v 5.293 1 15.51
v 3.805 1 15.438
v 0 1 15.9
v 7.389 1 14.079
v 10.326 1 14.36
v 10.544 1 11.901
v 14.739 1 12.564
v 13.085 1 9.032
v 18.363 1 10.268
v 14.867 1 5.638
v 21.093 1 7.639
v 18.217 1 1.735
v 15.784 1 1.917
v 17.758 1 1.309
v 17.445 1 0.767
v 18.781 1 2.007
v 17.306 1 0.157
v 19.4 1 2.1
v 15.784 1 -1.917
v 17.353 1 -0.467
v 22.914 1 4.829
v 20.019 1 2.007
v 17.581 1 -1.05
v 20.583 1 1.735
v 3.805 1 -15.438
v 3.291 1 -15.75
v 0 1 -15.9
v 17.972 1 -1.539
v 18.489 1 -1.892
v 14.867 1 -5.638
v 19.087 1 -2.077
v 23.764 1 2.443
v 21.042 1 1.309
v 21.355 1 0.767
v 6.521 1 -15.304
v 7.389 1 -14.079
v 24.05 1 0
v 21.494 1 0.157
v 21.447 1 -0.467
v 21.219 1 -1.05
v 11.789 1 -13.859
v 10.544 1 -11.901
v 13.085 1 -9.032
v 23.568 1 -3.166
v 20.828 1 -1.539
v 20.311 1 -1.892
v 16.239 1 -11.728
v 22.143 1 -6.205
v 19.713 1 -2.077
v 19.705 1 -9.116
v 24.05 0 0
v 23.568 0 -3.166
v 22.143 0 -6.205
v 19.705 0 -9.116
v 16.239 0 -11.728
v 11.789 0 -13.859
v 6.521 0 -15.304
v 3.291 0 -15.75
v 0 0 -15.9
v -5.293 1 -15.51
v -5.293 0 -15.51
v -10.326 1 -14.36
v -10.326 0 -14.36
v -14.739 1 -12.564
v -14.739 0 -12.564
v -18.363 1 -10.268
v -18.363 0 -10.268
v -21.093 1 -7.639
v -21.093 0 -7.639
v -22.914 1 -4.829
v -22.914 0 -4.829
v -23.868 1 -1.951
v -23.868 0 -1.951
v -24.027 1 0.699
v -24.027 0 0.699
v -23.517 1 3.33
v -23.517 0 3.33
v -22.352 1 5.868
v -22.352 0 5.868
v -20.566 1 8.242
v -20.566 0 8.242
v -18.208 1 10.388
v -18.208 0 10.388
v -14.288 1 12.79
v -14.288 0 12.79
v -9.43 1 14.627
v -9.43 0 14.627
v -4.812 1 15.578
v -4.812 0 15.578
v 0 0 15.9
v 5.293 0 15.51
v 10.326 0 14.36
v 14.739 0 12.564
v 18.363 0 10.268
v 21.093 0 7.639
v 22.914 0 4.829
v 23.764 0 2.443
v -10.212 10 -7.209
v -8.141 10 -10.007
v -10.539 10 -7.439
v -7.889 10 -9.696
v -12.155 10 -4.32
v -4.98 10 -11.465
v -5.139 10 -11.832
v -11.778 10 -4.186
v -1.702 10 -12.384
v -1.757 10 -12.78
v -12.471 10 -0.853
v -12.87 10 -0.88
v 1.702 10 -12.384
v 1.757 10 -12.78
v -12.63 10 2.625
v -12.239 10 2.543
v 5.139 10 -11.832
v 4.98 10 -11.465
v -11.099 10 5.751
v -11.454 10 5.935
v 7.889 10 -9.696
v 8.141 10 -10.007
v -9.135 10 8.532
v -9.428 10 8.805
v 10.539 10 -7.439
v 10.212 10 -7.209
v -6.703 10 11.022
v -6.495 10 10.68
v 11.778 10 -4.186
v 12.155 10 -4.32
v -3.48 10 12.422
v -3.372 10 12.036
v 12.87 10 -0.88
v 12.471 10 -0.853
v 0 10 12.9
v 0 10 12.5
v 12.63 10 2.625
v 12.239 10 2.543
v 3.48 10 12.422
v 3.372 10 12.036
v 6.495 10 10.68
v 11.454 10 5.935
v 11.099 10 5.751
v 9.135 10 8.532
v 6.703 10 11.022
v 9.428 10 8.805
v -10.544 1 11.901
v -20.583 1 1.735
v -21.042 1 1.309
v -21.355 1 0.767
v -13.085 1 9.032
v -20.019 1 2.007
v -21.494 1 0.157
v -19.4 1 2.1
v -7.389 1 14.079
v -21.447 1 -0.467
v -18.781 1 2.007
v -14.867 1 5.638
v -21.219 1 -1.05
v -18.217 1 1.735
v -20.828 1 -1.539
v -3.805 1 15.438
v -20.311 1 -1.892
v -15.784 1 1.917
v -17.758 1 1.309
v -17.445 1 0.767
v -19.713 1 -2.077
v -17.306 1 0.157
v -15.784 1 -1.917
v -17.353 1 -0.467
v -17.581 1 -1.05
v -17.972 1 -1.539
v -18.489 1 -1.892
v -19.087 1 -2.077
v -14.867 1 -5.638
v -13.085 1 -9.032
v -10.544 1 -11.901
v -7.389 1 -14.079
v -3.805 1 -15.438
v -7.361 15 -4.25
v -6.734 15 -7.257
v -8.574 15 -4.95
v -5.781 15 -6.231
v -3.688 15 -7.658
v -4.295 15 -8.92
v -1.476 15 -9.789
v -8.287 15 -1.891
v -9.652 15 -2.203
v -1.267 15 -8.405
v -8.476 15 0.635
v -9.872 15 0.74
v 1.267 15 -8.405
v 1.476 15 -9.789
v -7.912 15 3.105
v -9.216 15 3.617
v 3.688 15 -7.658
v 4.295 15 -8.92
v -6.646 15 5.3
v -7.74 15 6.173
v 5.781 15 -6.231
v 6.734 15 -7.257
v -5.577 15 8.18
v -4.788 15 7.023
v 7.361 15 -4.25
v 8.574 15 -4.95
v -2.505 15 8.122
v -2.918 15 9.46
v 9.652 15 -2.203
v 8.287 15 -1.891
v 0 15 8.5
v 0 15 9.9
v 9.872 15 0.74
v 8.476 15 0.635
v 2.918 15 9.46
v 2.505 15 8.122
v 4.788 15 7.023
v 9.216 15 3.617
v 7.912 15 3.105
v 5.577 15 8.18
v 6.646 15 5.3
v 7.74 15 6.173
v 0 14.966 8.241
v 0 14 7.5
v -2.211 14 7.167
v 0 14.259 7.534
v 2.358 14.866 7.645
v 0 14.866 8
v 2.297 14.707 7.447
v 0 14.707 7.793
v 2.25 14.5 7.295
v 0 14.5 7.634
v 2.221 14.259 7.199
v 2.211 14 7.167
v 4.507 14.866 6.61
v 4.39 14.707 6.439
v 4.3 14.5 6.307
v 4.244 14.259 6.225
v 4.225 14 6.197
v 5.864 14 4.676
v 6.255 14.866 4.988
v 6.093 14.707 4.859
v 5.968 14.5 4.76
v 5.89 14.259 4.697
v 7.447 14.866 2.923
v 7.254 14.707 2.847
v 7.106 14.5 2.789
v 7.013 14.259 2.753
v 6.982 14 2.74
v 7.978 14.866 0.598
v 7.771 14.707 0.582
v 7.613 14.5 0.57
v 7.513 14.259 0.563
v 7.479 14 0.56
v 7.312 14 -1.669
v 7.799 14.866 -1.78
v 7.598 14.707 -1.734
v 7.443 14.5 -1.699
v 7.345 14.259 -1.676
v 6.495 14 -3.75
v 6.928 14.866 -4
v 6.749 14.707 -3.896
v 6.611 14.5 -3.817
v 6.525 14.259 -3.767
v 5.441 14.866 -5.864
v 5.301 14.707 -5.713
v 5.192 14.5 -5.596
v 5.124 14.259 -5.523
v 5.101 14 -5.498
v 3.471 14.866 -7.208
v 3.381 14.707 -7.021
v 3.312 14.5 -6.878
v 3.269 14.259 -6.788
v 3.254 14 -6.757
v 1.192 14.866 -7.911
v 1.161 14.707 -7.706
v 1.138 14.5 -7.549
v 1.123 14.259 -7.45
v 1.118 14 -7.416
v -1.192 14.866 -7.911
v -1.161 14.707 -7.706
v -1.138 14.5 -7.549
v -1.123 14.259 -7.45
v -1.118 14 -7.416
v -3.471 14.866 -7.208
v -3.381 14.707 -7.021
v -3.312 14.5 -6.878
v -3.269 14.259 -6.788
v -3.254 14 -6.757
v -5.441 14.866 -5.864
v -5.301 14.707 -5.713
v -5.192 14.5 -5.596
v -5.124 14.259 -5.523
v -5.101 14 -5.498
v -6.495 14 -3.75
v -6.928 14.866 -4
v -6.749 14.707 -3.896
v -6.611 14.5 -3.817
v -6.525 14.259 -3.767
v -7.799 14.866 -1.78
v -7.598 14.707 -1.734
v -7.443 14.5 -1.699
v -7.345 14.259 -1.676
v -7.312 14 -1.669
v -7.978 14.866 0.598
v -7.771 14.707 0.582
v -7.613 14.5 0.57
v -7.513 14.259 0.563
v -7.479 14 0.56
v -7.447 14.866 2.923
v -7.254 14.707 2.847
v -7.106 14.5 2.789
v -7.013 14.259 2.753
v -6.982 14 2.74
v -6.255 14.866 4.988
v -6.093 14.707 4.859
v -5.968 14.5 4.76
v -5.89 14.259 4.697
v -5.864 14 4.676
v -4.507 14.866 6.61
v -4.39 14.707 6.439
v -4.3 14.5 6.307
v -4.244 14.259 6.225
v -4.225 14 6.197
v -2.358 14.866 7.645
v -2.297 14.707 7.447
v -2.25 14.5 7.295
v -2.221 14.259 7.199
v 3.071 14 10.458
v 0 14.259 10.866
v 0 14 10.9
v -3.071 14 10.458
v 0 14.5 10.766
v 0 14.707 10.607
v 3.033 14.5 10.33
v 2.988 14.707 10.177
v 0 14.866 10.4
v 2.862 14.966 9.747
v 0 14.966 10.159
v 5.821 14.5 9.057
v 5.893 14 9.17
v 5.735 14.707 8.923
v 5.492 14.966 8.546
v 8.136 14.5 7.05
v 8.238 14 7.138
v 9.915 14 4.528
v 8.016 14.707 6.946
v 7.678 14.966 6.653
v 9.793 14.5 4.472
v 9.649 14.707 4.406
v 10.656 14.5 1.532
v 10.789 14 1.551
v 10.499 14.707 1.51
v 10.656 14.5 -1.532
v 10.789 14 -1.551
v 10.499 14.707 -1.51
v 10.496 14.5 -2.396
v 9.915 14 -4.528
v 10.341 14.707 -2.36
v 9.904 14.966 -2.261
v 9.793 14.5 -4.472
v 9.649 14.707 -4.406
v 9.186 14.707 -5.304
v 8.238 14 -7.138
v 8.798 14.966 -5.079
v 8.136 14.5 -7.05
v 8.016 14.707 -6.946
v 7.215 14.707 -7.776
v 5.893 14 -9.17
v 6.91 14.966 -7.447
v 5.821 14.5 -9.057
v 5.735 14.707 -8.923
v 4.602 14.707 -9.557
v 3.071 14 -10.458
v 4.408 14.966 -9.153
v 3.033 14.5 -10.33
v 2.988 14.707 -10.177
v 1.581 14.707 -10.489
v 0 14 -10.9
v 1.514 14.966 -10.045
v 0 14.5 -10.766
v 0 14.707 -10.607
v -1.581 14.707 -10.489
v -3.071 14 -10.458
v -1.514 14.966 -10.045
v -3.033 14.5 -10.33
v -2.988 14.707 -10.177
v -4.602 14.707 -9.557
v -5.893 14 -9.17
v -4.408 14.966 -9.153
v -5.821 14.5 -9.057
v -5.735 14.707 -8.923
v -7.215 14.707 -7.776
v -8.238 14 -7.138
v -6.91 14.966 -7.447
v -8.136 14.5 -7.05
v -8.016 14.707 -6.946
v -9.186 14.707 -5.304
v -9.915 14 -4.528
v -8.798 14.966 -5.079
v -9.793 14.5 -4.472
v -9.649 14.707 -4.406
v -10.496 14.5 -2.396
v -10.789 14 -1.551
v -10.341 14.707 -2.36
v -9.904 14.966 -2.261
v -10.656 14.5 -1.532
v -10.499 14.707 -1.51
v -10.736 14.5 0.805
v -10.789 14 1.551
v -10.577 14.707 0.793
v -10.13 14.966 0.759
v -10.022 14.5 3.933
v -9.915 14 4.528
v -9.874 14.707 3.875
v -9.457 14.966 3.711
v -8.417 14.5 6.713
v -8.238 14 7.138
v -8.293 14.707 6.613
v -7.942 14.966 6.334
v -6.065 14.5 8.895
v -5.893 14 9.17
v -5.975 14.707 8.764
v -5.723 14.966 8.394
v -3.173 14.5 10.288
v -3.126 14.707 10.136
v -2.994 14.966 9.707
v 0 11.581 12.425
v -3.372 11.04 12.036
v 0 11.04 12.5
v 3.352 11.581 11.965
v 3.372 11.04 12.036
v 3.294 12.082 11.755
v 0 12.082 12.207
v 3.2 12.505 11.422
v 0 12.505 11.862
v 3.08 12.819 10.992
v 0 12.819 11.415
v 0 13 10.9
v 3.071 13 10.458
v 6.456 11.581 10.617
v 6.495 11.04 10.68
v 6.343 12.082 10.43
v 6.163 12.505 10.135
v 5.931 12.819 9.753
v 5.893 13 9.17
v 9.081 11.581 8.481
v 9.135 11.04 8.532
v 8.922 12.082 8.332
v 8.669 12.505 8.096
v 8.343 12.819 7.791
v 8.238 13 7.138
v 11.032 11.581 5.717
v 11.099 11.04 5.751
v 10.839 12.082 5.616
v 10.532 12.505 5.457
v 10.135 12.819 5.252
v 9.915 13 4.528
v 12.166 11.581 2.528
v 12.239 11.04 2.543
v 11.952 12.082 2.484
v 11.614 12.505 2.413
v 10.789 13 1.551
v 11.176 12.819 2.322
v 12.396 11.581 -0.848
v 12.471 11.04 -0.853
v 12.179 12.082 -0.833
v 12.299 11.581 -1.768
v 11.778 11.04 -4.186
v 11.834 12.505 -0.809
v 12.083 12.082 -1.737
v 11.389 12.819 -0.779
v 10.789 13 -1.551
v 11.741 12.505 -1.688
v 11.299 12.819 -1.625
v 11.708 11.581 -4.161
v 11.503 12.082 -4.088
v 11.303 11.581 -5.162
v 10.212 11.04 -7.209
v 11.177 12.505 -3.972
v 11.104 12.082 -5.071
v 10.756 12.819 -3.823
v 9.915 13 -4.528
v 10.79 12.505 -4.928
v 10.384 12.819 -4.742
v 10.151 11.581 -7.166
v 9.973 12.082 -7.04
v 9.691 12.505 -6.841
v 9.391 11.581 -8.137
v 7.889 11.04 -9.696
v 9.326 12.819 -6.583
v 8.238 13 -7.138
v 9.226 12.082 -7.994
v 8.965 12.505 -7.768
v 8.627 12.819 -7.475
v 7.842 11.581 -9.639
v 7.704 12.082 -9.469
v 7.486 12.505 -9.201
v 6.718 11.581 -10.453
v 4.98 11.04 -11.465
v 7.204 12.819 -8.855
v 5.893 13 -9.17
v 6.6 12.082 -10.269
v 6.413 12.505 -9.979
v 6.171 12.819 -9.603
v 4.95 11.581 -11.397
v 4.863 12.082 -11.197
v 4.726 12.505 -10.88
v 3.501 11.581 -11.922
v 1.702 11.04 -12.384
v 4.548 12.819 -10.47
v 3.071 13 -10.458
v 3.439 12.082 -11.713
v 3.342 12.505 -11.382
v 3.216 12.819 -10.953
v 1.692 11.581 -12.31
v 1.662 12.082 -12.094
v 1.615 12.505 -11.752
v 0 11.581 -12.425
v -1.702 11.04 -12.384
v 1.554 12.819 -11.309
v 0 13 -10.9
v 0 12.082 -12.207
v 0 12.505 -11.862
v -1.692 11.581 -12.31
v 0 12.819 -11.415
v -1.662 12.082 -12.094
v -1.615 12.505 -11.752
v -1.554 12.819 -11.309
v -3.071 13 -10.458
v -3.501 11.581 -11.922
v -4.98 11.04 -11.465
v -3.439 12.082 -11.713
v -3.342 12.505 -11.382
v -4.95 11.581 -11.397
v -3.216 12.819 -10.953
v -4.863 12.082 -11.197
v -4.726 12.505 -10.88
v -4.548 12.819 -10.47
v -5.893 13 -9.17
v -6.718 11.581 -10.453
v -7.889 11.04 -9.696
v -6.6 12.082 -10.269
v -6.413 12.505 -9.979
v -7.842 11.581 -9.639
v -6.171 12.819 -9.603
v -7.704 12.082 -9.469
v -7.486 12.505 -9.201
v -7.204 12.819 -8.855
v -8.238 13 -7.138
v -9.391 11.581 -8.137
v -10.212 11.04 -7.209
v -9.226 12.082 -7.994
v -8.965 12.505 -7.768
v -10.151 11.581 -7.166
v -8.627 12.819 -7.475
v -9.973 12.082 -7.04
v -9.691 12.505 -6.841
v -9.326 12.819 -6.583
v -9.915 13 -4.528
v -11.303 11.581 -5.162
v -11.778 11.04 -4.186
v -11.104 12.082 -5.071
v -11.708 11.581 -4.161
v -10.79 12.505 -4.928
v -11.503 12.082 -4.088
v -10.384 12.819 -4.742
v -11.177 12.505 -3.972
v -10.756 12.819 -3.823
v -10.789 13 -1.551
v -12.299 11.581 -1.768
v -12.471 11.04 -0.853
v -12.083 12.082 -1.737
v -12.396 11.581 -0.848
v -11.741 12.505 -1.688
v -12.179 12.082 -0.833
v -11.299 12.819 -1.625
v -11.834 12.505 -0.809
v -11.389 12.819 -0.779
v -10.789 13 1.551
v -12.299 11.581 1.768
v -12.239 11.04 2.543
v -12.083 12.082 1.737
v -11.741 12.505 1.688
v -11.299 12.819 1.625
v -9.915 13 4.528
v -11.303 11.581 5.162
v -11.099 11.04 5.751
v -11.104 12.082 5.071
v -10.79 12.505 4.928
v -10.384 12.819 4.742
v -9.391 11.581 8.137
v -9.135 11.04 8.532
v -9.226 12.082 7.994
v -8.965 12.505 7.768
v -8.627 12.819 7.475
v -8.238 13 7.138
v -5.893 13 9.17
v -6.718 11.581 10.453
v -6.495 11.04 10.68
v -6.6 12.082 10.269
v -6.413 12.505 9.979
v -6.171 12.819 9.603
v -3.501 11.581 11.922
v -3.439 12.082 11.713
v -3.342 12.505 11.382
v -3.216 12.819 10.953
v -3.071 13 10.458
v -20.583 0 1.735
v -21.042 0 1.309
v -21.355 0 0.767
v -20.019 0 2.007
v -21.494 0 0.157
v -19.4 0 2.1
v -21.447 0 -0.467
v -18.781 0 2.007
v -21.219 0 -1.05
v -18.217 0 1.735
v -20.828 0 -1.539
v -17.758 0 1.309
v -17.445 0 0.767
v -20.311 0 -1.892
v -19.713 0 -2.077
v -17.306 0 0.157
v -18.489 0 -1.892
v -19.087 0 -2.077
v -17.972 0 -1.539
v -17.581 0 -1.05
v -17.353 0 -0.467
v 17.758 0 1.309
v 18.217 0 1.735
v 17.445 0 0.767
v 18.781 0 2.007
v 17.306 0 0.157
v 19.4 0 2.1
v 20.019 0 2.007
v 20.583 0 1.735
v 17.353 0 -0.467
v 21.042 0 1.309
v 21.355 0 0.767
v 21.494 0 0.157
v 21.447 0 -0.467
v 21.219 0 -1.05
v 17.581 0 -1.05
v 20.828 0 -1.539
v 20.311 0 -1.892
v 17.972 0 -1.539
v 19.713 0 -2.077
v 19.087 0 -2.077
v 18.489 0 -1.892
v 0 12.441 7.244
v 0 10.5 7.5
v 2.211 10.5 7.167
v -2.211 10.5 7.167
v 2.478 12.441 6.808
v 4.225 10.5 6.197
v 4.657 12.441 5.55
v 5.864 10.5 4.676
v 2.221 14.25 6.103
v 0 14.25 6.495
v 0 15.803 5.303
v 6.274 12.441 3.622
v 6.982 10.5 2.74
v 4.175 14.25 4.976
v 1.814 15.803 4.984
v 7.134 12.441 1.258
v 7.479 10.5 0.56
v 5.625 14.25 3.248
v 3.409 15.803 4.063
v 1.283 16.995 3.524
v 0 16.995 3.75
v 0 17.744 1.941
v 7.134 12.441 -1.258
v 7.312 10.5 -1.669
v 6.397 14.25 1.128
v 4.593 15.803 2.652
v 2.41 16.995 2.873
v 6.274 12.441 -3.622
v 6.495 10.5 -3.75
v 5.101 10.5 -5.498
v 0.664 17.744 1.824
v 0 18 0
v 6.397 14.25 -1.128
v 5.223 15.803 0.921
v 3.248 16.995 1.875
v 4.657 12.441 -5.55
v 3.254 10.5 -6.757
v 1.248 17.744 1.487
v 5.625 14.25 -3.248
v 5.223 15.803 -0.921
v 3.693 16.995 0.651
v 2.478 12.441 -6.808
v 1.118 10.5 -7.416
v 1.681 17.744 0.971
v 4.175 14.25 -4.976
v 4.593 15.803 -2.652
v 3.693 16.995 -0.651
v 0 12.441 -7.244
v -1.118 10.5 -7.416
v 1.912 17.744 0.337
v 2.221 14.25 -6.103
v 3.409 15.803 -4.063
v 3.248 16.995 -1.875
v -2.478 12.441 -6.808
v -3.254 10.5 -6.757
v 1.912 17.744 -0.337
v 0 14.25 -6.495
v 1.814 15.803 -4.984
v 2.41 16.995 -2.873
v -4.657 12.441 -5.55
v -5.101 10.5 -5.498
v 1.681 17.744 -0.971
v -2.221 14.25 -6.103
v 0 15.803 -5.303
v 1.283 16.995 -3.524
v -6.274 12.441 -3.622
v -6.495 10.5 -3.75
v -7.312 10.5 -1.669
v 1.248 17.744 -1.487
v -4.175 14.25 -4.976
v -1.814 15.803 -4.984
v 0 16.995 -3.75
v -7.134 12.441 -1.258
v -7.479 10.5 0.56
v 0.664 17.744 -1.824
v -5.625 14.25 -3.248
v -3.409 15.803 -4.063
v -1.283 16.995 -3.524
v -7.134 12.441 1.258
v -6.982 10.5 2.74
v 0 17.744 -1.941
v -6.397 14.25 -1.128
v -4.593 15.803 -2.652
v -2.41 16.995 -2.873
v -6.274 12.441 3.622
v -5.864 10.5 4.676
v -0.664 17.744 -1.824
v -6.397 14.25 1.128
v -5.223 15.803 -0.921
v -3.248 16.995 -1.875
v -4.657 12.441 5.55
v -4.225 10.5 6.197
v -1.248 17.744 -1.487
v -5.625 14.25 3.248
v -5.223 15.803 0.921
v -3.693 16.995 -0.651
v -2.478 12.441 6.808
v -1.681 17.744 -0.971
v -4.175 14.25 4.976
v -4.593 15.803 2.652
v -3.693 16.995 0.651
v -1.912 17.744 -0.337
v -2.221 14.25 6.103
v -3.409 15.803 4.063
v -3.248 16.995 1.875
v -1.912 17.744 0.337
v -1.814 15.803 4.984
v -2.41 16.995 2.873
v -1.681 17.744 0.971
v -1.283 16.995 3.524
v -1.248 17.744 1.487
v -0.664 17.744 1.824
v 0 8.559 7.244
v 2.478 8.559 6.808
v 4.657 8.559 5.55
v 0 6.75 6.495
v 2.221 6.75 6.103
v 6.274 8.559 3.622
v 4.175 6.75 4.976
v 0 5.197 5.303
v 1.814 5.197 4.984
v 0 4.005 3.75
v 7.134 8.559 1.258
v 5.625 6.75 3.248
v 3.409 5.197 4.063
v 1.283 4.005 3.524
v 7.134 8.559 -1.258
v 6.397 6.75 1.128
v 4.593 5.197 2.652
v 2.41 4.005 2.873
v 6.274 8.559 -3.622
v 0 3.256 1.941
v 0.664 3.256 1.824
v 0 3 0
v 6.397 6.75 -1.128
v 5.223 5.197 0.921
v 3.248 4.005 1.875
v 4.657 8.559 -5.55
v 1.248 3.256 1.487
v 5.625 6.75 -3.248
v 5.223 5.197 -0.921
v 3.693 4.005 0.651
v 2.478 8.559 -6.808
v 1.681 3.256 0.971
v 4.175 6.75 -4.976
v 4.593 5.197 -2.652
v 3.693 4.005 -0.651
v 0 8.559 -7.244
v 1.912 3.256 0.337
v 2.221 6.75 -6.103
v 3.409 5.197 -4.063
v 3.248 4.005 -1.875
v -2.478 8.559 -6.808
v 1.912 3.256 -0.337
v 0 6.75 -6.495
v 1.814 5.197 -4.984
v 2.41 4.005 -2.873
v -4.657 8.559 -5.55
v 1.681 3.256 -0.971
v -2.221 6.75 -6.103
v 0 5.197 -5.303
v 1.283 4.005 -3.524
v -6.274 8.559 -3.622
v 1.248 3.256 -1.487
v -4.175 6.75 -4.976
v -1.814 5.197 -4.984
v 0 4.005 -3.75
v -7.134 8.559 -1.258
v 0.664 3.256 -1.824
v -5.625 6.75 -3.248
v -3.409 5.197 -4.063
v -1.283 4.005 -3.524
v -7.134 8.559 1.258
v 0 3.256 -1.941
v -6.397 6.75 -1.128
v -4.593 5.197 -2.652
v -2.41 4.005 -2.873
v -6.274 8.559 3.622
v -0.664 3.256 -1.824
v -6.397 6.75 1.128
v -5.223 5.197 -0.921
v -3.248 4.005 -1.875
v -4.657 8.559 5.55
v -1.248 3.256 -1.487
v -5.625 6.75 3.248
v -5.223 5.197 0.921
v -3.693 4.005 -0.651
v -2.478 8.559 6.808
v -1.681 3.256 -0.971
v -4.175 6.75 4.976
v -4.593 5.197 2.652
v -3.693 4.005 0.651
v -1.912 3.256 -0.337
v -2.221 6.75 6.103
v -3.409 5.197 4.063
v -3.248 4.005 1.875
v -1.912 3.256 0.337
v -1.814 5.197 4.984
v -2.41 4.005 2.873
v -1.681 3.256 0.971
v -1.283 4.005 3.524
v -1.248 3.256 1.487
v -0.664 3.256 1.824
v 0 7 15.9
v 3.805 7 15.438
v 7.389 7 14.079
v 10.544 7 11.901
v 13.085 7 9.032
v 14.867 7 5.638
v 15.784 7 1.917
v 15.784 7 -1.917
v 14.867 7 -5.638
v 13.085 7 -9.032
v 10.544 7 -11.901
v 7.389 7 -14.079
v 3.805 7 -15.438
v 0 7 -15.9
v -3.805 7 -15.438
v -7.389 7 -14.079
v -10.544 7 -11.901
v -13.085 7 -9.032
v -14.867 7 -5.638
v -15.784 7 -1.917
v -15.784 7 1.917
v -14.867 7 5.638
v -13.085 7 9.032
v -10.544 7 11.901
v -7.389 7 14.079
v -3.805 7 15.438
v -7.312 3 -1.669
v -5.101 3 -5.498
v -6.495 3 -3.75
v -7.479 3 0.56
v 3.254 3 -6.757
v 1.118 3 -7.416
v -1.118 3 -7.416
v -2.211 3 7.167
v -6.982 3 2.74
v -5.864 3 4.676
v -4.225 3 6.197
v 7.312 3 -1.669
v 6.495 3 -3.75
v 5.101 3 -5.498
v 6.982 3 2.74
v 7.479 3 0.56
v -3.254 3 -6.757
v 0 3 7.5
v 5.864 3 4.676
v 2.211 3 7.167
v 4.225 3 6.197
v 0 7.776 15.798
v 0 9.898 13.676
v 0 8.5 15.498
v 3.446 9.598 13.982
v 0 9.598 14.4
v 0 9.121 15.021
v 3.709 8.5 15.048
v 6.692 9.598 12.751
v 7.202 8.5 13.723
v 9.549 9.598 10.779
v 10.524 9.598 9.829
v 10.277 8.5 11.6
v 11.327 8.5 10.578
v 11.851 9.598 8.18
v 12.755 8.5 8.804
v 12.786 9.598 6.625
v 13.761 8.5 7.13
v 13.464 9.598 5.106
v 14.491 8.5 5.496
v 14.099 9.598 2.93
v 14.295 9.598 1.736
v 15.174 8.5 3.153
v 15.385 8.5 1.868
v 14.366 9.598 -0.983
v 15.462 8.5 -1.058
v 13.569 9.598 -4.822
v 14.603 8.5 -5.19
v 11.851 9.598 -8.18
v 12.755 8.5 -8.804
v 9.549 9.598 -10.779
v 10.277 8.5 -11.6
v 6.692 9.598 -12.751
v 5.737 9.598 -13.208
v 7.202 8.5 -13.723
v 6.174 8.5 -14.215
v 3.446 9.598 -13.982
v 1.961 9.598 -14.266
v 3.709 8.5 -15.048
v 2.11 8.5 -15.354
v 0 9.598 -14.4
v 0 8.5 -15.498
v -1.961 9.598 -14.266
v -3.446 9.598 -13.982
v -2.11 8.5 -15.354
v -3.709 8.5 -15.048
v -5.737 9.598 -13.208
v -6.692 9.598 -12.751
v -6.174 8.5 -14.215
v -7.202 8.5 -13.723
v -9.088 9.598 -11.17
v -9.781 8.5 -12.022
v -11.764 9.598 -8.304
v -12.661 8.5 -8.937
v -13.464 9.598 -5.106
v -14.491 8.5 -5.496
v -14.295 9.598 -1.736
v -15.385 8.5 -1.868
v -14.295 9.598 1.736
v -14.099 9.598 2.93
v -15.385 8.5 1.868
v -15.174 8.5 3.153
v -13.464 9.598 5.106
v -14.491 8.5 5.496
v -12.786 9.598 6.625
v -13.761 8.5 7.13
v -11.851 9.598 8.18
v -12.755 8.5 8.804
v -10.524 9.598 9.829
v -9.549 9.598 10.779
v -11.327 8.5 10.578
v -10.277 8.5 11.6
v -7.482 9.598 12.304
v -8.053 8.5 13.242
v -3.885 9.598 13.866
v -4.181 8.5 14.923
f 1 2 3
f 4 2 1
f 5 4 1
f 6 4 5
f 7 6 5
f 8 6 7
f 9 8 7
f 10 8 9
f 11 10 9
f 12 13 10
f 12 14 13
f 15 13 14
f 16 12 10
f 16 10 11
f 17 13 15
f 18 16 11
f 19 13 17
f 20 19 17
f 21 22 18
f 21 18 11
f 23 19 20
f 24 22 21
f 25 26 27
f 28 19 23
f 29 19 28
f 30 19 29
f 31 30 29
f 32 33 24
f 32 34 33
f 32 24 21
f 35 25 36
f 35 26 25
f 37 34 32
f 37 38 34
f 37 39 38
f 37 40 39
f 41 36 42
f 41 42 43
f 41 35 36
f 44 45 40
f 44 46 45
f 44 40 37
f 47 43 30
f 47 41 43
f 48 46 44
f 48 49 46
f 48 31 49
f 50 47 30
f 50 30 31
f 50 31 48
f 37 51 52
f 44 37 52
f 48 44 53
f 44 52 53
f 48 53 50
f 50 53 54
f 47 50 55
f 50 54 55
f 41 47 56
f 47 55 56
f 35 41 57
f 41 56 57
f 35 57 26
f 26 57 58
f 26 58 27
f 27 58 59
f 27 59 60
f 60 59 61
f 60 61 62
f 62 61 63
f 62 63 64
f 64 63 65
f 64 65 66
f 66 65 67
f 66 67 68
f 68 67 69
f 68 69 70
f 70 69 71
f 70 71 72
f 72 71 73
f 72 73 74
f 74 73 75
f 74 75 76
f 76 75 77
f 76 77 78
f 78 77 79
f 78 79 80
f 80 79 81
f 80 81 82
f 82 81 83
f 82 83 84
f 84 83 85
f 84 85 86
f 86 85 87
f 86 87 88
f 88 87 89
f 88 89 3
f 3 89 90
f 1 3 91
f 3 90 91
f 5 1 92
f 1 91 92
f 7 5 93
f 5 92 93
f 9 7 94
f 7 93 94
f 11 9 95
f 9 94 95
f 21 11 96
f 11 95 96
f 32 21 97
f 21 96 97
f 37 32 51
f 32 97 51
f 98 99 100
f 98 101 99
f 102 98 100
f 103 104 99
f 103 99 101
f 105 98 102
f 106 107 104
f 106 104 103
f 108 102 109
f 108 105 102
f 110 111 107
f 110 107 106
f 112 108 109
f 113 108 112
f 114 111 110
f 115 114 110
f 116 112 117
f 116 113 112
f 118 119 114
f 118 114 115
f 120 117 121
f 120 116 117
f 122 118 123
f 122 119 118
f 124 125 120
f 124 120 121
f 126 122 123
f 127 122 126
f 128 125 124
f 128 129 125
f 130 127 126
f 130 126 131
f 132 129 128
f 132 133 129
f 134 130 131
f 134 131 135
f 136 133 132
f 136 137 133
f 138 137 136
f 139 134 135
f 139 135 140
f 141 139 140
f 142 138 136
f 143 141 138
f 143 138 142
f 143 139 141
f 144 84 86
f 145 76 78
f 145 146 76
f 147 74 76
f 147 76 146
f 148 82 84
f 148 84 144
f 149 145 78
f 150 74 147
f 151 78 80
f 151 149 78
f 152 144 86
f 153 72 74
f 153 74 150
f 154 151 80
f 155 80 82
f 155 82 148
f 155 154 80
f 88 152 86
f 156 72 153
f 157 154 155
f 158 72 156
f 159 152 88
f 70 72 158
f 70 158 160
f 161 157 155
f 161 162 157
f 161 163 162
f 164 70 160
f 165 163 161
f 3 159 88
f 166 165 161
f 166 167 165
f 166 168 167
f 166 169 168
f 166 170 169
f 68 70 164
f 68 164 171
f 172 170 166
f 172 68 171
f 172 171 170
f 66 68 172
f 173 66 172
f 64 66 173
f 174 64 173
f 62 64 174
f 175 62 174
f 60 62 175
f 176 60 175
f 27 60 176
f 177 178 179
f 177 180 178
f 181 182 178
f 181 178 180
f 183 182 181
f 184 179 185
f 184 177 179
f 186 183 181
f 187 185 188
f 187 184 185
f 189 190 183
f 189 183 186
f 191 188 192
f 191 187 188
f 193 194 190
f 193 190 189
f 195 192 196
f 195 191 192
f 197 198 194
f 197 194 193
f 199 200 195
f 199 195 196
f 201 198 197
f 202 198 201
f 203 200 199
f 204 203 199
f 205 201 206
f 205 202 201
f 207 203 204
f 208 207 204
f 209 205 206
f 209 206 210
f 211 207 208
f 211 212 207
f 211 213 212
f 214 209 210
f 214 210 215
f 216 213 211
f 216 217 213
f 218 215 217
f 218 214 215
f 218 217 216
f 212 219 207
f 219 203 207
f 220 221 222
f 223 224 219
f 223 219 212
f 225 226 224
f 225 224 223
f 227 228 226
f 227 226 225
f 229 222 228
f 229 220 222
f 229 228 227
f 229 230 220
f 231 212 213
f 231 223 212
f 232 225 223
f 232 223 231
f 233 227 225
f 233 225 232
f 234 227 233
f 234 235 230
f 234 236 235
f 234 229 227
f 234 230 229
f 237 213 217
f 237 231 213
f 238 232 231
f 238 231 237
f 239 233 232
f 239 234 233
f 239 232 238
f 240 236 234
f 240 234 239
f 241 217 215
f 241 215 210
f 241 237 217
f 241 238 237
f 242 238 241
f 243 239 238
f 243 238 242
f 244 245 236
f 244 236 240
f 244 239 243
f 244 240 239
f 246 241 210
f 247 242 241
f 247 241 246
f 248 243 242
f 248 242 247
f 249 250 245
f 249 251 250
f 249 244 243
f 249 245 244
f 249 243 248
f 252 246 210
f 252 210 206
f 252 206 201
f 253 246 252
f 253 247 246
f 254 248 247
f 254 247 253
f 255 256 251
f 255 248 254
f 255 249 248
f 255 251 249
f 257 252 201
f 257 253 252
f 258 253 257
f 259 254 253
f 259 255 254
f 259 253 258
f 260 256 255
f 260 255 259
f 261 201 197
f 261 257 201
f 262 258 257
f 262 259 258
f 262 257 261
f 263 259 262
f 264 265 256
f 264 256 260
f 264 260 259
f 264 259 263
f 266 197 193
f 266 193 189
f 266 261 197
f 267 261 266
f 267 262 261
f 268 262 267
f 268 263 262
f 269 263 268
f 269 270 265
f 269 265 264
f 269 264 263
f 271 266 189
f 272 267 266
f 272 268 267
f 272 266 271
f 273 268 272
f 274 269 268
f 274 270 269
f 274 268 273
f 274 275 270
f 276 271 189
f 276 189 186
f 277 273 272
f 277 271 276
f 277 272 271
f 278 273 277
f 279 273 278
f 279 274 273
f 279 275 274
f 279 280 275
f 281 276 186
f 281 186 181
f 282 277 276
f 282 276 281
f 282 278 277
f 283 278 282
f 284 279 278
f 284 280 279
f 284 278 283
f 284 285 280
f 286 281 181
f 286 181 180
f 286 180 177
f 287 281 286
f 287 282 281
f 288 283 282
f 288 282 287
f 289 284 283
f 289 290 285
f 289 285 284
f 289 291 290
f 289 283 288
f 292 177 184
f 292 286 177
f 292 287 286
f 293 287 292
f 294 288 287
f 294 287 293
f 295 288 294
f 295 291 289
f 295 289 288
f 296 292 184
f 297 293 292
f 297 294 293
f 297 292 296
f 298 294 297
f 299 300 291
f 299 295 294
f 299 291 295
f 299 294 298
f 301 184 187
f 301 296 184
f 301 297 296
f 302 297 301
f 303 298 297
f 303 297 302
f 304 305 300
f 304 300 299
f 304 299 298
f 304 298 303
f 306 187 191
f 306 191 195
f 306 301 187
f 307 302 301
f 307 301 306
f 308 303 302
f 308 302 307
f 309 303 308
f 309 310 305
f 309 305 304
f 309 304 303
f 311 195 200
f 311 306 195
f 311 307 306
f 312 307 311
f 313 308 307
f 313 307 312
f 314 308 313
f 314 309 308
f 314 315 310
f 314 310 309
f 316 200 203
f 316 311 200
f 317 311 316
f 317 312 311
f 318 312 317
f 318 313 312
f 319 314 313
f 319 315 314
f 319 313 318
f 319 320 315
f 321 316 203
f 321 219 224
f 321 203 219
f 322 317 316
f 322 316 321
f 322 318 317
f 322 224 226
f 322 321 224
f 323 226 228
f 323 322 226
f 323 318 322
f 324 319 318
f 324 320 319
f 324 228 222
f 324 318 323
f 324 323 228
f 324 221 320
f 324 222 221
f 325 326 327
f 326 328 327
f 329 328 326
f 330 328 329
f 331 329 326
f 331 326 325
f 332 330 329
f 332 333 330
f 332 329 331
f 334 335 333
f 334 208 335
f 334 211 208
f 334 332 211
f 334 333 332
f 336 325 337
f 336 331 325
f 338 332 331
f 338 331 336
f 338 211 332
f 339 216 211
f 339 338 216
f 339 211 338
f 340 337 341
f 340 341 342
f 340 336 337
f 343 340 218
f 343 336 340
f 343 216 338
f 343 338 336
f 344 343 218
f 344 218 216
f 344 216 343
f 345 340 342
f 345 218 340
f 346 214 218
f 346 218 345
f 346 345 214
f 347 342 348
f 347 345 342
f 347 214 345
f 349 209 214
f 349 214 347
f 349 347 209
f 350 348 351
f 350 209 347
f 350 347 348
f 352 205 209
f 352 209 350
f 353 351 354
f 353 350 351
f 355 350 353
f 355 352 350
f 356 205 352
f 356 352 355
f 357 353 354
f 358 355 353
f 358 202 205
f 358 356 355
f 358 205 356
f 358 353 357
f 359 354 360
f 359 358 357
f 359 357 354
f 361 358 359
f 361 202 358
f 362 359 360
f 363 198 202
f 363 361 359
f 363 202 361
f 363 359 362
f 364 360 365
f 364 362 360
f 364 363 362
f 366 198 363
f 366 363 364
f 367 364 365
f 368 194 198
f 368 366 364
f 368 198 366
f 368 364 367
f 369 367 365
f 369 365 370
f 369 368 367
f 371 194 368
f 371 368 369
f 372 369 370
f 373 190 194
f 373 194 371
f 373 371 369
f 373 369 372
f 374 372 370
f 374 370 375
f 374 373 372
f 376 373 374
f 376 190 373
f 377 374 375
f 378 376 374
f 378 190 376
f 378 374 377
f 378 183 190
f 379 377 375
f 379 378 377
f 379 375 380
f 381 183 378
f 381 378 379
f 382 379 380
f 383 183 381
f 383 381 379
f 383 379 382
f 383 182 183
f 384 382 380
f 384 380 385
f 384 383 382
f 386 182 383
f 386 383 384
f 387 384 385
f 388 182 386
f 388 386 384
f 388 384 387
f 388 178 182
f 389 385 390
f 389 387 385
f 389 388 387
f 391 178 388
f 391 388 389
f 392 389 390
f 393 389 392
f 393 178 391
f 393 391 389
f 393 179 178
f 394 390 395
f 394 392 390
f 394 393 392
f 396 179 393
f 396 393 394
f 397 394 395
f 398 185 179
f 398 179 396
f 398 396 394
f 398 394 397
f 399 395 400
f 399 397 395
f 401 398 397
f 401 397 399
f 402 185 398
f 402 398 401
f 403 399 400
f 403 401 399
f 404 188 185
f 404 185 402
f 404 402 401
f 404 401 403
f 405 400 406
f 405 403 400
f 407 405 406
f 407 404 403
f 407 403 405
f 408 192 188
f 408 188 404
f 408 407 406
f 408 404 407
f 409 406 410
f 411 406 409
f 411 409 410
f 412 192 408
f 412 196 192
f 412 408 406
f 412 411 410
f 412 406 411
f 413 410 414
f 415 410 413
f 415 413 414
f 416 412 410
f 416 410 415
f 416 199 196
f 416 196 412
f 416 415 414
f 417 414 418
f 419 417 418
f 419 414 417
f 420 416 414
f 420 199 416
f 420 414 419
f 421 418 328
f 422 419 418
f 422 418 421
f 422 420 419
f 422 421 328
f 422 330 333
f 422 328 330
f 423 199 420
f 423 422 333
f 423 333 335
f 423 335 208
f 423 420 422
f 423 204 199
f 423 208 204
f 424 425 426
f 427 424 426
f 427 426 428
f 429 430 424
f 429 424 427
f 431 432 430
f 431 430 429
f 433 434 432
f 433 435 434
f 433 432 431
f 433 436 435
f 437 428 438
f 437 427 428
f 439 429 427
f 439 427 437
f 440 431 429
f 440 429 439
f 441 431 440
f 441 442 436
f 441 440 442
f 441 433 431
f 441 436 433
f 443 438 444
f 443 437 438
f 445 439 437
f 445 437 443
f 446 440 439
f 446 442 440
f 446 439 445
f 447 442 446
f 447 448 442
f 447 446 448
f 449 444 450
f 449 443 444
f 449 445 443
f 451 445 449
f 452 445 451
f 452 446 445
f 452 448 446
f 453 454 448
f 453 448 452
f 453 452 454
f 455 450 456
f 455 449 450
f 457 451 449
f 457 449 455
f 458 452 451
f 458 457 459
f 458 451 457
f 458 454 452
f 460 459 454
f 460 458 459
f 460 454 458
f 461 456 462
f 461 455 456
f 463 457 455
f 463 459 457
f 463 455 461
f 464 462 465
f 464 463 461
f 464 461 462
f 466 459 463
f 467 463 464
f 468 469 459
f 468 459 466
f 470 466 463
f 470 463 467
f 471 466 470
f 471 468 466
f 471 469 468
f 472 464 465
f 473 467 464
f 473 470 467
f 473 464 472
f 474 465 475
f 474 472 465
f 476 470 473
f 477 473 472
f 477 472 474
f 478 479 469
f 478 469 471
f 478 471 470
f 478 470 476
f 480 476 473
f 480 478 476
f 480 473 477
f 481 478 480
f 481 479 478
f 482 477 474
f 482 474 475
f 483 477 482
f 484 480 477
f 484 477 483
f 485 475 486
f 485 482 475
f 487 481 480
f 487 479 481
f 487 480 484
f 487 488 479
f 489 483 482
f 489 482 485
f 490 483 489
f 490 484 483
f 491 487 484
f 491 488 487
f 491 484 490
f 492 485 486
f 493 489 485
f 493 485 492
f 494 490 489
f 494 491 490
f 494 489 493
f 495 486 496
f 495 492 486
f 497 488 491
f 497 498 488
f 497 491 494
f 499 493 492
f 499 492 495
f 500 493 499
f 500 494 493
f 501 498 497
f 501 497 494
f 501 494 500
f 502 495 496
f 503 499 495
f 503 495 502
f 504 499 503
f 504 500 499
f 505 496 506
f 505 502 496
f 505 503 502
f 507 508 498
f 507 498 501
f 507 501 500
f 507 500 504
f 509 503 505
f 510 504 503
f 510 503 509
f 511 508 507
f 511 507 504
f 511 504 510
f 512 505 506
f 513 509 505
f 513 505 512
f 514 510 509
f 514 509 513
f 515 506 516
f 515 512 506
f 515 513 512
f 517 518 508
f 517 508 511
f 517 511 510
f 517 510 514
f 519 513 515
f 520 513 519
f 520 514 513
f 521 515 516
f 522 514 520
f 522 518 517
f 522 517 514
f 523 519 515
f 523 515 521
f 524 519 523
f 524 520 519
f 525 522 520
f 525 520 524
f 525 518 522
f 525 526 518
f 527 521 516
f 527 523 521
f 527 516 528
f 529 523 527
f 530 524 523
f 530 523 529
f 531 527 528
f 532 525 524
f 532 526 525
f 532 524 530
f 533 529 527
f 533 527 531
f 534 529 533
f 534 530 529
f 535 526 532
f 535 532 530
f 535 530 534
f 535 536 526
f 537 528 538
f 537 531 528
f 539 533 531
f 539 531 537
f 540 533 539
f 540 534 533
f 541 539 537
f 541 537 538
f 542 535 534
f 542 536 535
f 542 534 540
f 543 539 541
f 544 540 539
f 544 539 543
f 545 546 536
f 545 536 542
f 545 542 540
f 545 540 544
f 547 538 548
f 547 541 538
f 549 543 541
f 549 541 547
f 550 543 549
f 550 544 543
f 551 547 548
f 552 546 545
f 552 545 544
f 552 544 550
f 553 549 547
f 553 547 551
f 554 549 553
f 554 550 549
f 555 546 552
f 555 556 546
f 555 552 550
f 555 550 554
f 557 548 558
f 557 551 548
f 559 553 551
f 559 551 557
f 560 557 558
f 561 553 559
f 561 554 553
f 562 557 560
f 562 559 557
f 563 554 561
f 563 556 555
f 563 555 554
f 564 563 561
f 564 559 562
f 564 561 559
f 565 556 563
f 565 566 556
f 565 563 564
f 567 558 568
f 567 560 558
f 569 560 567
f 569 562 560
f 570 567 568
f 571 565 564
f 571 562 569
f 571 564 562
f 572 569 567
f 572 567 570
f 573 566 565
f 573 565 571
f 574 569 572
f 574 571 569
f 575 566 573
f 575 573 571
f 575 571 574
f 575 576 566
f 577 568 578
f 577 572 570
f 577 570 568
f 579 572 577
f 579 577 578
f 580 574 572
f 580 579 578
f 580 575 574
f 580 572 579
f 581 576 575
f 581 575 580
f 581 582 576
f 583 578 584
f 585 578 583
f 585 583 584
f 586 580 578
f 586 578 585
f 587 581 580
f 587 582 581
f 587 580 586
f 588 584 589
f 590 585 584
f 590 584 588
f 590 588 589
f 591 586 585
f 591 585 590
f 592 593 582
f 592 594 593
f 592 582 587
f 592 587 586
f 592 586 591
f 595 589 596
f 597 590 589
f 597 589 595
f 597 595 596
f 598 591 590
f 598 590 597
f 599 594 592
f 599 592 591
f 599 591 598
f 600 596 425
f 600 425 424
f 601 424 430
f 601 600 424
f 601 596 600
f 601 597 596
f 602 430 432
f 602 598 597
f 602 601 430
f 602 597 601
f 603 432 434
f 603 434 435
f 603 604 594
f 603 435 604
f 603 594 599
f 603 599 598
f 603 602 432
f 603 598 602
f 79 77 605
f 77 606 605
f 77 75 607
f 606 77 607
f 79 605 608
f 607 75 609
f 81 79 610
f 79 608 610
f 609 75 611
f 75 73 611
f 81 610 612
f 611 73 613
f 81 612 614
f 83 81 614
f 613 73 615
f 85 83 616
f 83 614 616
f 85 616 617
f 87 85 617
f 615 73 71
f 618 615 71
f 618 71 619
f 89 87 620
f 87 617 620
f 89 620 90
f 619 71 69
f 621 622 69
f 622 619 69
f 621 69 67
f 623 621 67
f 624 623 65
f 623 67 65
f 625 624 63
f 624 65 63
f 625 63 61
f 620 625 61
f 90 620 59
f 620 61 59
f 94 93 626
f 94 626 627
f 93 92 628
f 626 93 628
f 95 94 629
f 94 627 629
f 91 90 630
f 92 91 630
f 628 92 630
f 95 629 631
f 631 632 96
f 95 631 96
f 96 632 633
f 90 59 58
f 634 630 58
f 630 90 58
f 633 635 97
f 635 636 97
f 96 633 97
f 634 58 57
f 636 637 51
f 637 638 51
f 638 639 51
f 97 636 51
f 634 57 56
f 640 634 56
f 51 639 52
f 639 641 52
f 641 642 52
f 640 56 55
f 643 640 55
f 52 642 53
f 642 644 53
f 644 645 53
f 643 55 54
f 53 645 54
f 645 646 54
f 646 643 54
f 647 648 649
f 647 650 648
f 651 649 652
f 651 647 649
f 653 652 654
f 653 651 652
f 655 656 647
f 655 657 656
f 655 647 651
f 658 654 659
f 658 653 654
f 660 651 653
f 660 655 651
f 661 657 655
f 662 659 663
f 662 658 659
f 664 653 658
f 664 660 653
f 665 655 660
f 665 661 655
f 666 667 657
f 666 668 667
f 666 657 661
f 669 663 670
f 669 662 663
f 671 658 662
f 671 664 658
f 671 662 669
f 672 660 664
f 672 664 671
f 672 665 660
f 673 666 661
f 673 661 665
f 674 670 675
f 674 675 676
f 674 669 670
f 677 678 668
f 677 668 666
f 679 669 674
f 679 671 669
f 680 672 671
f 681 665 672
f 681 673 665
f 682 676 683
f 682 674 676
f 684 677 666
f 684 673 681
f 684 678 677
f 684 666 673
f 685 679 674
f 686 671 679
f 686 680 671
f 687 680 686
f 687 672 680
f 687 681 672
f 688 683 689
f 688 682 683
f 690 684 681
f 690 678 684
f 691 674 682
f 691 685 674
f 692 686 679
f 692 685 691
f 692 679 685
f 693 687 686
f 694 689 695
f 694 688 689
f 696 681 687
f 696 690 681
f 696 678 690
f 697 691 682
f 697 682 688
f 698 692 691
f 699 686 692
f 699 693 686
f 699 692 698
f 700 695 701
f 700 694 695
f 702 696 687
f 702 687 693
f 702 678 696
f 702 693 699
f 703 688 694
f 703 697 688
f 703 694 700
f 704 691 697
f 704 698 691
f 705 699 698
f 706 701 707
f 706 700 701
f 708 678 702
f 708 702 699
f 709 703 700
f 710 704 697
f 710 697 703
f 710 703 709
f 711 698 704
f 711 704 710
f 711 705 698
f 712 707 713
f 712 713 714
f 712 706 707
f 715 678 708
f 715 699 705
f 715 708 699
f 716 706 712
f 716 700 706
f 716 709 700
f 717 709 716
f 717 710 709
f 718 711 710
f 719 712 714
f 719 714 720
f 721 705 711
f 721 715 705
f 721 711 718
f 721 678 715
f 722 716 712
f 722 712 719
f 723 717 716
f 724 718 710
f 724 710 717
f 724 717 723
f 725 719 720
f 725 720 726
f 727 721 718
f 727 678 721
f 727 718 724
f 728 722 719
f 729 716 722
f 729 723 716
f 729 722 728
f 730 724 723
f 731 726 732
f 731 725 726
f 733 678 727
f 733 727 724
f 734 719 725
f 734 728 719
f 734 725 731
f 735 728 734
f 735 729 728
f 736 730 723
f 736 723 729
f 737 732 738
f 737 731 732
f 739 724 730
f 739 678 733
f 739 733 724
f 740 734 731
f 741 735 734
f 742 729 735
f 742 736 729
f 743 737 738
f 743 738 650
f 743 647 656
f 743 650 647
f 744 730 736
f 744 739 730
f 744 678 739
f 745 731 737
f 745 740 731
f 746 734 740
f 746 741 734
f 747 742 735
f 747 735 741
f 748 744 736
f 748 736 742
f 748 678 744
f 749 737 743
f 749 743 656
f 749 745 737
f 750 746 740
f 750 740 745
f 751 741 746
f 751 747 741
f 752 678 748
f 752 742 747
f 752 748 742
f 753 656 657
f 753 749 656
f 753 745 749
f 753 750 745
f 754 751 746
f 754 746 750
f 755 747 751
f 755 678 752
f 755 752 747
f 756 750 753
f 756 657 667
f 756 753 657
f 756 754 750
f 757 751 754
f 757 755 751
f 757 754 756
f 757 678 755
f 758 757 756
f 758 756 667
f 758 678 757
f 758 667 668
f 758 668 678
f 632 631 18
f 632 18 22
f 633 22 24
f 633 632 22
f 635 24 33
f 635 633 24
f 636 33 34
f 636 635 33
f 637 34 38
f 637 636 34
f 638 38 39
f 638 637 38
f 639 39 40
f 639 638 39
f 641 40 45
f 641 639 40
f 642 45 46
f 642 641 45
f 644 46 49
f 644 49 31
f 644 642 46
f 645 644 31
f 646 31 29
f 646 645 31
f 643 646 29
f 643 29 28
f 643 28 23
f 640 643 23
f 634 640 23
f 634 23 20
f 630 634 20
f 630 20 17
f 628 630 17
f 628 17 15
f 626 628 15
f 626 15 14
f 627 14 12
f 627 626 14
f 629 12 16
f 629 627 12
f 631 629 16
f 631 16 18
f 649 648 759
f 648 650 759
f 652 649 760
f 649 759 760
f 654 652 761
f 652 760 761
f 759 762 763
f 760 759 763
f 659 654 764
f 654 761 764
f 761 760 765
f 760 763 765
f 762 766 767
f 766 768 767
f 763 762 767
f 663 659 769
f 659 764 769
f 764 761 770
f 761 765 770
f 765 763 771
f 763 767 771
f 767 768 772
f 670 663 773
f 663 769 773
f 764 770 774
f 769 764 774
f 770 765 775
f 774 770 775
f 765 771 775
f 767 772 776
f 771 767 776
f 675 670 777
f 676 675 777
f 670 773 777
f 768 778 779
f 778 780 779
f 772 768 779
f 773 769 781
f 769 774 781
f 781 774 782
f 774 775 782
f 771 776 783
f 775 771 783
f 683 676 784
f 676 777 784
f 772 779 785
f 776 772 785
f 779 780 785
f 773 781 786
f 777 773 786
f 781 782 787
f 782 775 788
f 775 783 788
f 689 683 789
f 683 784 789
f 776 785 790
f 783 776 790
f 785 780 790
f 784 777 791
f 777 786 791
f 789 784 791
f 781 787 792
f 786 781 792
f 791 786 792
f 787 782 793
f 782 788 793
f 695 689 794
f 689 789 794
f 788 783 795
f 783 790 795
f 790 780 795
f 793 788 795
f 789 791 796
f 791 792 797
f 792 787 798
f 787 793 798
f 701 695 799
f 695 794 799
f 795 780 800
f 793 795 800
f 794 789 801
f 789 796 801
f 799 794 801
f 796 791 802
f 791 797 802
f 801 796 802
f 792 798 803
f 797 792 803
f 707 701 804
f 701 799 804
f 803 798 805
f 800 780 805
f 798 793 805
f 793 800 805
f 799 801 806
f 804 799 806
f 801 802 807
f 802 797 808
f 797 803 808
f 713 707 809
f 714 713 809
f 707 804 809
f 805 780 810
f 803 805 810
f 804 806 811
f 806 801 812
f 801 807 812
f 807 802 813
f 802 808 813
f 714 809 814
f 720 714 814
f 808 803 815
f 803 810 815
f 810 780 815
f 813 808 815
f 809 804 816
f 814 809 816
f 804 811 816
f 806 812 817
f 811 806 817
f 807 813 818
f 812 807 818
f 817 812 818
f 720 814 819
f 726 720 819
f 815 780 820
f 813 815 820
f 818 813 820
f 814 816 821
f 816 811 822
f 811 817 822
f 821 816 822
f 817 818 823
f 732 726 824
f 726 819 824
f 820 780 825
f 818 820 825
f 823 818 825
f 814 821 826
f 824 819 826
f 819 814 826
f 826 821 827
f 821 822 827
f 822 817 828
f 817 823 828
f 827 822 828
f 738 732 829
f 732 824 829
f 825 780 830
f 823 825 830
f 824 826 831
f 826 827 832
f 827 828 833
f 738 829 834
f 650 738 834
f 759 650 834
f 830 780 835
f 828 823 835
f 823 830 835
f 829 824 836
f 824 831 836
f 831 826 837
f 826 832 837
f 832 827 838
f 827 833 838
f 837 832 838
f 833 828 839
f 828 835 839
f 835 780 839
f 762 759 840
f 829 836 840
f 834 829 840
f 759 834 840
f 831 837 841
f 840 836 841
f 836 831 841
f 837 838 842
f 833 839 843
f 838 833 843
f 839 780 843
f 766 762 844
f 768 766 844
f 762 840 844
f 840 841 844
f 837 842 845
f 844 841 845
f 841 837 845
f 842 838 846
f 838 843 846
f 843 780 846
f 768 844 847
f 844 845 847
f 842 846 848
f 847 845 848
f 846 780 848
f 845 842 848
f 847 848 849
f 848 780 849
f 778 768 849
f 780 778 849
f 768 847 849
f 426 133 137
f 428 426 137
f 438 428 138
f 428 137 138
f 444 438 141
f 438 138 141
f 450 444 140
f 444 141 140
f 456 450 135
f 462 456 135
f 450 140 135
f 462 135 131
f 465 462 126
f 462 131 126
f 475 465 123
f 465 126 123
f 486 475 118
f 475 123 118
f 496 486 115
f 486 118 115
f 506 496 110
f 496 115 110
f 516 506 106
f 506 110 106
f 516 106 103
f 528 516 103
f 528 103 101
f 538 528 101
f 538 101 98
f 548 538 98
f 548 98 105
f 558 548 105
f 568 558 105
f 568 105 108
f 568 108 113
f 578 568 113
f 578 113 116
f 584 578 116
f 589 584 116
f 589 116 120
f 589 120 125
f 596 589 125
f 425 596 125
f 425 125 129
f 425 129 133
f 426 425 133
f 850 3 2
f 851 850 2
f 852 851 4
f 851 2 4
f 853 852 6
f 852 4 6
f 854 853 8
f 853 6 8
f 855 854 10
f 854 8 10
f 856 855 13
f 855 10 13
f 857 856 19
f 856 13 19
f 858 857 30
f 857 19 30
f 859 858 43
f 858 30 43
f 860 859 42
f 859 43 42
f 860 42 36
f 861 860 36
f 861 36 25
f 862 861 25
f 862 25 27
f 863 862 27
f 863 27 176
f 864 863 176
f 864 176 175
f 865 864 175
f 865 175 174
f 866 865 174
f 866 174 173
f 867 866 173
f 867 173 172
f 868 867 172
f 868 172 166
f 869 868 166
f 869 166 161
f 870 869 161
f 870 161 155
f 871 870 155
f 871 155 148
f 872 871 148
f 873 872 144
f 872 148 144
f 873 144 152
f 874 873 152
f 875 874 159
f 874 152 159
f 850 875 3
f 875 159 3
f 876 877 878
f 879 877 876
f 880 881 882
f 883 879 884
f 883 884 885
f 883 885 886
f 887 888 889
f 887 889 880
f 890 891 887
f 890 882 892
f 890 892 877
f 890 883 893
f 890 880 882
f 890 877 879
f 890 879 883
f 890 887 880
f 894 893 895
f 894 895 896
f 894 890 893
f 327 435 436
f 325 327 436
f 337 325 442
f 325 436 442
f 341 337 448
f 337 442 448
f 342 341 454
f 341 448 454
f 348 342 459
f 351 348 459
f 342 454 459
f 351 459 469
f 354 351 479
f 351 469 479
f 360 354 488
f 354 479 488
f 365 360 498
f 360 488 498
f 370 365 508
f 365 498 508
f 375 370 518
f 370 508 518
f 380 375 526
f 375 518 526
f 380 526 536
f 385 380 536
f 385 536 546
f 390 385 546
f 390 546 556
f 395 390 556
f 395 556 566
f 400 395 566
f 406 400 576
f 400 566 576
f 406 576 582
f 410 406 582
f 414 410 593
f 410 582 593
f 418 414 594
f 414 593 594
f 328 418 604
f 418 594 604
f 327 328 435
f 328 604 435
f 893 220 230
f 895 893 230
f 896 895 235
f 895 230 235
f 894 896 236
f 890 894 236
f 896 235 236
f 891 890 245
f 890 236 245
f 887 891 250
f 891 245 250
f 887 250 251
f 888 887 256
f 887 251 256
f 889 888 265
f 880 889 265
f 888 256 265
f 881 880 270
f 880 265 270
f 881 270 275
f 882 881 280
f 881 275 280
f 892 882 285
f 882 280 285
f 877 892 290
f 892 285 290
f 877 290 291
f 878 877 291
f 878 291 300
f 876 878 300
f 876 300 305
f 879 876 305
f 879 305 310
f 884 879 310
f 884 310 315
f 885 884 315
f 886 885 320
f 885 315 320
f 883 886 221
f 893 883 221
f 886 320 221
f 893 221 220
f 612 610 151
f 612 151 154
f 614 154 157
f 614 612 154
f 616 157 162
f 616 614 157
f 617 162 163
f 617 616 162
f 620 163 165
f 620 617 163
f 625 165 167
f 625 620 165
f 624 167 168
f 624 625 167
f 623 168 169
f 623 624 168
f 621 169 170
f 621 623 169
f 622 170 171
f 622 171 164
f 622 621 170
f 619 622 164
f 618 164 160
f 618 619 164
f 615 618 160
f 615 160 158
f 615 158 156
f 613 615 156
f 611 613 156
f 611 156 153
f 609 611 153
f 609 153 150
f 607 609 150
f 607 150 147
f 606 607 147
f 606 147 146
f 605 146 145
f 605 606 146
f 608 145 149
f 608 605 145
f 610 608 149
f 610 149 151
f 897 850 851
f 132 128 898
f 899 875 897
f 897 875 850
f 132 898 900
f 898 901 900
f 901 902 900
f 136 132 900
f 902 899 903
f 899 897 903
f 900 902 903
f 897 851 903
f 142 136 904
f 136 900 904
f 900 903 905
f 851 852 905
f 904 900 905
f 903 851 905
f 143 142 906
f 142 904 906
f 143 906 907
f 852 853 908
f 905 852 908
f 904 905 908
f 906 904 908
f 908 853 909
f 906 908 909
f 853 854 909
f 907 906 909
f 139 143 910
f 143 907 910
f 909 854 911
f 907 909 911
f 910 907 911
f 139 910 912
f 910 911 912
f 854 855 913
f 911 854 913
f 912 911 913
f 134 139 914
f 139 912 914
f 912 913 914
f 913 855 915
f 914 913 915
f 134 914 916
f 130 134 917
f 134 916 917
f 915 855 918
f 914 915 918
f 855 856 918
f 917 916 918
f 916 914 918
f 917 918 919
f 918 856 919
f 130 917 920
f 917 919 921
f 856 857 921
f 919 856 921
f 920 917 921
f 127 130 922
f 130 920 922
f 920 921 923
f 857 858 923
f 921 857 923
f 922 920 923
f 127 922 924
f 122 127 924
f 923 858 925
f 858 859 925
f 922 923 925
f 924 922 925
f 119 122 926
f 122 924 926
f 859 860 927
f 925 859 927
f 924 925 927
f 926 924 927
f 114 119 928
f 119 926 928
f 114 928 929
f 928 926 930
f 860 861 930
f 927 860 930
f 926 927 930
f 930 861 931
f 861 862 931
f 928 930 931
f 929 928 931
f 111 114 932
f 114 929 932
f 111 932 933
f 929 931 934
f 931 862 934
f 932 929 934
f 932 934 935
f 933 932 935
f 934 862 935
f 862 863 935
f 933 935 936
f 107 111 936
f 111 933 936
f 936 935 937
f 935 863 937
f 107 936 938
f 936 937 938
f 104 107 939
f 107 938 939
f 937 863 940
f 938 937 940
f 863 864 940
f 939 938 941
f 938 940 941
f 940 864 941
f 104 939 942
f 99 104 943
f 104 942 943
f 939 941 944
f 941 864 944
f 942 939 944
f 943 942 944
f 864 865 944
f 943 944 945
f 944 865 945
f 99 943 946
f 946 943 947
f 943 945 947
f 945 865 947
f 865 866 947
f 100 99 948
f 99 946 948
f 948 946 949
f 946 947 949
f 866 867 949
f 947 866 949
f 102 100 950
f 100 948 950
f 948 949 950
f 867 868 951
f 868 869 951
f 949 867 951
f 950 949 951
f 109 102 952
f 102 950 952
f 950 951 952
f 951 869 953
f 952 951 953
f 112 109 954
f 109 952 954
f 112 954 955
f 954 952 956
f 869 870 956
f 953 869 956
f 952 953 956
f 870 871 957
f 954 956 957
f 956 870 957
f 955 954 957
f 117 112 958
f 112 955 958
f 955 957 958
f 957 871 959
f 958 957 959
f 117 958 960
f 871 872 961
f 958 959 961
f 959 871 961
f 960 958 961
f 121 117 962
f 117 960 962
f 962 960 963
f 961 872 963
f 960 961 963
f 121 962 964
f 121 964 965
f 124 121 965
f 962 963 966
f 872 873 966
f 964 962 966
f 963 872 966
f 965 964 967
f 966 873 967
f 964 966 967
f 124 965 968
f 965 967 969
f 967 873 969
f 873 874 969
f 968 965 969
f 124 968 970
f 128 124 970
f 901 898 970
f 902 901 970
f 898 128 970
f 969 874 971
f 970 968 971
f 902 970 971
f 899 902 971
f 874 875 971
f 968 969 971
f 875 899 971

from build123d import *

# Parameters (mm, degrees)
SKETCH_1_RX         = 24.05
SKETCH_1_RY         = 15.9
SKETCH_1_R          = 2.1
EXTRUDE_1_DEPTH     = 1
SKETCH_1_3_R        = 15.9
EXTRUDE_2_DEPTH     = 15
SKETCH_2_R          = 7.5
CUT_EXTRUDE_2_DEPTH = 12
SKETCH_5_R          = 7.5
EXTRUDE_4_DEPTH     = 15
FILLET_4_R          = 7.5
CUT_EXTRUDE_START   = -5
SKETCH_6_R          = 15.9
SKETCH_6_R_2        = 12.5
CUT_EXTRUDE_3_DEPTH = 5
CUT_EXTRUDE_START_2 = -2
SKETCH_7_R          = 12.5
SKETCH_7_R_2        = 10.9
CUT_EXTRUDE_4_DEPTH = 2
FILLET_5_R          = 1
FILLET_8_R          = 3
FILLET_9_R          = 2


# Some blends are built 0.0001 mm under size
with BuildPart() as part:
    # 草图1 → 凸台-拉伸1 (new body)
    with BuildSketch(Plane(origin=(0, 0, 0), x_dir=(1, 0, 0), z_dir=(0, 1, 0))):
        with Locations((0, 0)):
            Ellipse(SKETCH_1_RX, SKETCH_1_RY)
        with Locations(Location((-19.4, 0, 0), (0, 0, 270))):
            Circle(SKETCH_1_R, mode=Mode.SUBTRACT)
        with Locations(Location((19.4, 0, 0), (0, 0, 270))):
            Circle(SKETCH_1_R, mode=Mode.SUBTRACT)
    extrude(amount=EXTRUDE_1_DEPTH)

    # 草图1<3> → 凸台-拉伸2 (add)
    with BuildSketch(Plane(origin=(0, 0, 0), x_dir=(1, 0, 0), z_dir=(0, 1, 0))):
        with Locations(Location((0, 0, 0), (0, 0, 270))):
            Circle(SKETCH_1_3_R)
    extrude(amount=EXTRUDE_2_DEPTH)

    # 草图2 → 切除-拉伸2 (cut)
    with BuildSketch(Plane(origin=(0, 15, 0), x_dir=(1, 0, 0), z_dir=(0, 1, 0))):
        with Locations(Location((0, 0, 0), (0, 0, 270))):
            Circle(SKETCH_2_R)
    extrude(amount=-CUT_EXTRUDE_2_DEPTH, mode=Mode.SUBTRACT)

    # 草图6 → 切除-拉伸3 (cut)
    with BuildSketch(Plane(origin=(0, 15, 0), x_dir=(1, 0, 0), z_dir=(0, 1, 0)).offset(CUT_EXTRUDE_START)):
        with Locations(Location((0, 0, 0), (0, 0, 270))):
            Circle(SKETCH_6_R)
        with Locations(Location((0, 0, 0), (0, 0, 270))):
            Circle(SKETCH_6_R_2, mode=Mode.SUBTRACT)
    extrude(amount=CUT_EXTRUDE_3_DEPTH, mode=Mode.SUBTRACT)

    # 草图7 → 切除-拉伸4 (cut)
    with BuildSketch(Plane(origin=(0, 15, 0), x_dir=(1, 0, 0), z_dir=(0, 1, 0)).offset(CUT_EXTRUDE_START_2)):
        with Locations(Location((0, 0, 0), (0, 0, 270))):
            Circle(SKETCH_7_R)
        with Locations(Location((0, 0, 0), (0, 0, 270))):
            Circle(SKETCH_7_R_2, mode=Mode.SUBTRACT)
    extrude(amount=CUT_EXTRUDE_4_DEPTH, mode=Mode.SUBTRACT)

    # 圆角5
    fillet_5_edges = [part.edges().sort_by_distance(p)[0] for p in [
        (0, 15, -7.5),
        (0, 15, -10.9),
    ]]
    fillet(fillet_5_edges, radius=FILLET_5_R)

    # 圆角8
    fillet_8_edges = [part.edges().sort_by_distance(p)[0] for p in [
        (0, 10, -15.9),
    ]]
    fillet(fillet_8_edges, radius=FILLET_8_R)

    # 圆角9
    # the kernel refuses this fillet: 2 mm, written as the material it takes off along each edge
    with BuildSketch(Plane(origin=(0, 13, 0), x_dir=(0, 0, 1), z_dir=(-1, 0, 0))) as fillet_9_piece_1:
        with BuildLine():
            CenterArc((10.5, -1.959591794), FILLET_9_R, 0, 78.463040967)
            Line((10.9, 0), (10.908, 0.039191836))
            ThreePointArc((10.908, 0.039191836), (11.7, 0.04), (12.5, 0.04))
            Line((12.5, 0.04), (12.54, 0))
            Line((12.54, 0), (12.54, -1.959591794))
            Line((12.54, -1.959591794), (12.5, -1.959591794))
        make_face()
    revolve(axis=Axis((0, 13, 0), (0, 1, 0)), mode=Mode.SUBTRACT)


with BuildPart() as body_2:
    # 草图5 → 凸台-拉伸4 (new body)
    with BuildSketch(Plane(origin=(0, 3, 0), x_dir=(1, 0, 0), z_dir=(0, 1, 0))):
        with Locations(Location((0, 0, 0), (0, 0, 270))):
            Circle(SKETCH_5_R)
    extrude(amount=EXTRUDE_4_DEPTH)

    # 圆角4
    fillet_4_edges = [body_2.edges().sort_by_distance(p)[0] for p in [
        (0, 3, -7.5),
        (0, 18, -7.5),
    ]]
    fillet(fillet_4_edges, radius=FILLET_4_R - 0.0001)  # a hair under: the kernel refuses the full size


solid = Compound([part.part, body_2.part])
